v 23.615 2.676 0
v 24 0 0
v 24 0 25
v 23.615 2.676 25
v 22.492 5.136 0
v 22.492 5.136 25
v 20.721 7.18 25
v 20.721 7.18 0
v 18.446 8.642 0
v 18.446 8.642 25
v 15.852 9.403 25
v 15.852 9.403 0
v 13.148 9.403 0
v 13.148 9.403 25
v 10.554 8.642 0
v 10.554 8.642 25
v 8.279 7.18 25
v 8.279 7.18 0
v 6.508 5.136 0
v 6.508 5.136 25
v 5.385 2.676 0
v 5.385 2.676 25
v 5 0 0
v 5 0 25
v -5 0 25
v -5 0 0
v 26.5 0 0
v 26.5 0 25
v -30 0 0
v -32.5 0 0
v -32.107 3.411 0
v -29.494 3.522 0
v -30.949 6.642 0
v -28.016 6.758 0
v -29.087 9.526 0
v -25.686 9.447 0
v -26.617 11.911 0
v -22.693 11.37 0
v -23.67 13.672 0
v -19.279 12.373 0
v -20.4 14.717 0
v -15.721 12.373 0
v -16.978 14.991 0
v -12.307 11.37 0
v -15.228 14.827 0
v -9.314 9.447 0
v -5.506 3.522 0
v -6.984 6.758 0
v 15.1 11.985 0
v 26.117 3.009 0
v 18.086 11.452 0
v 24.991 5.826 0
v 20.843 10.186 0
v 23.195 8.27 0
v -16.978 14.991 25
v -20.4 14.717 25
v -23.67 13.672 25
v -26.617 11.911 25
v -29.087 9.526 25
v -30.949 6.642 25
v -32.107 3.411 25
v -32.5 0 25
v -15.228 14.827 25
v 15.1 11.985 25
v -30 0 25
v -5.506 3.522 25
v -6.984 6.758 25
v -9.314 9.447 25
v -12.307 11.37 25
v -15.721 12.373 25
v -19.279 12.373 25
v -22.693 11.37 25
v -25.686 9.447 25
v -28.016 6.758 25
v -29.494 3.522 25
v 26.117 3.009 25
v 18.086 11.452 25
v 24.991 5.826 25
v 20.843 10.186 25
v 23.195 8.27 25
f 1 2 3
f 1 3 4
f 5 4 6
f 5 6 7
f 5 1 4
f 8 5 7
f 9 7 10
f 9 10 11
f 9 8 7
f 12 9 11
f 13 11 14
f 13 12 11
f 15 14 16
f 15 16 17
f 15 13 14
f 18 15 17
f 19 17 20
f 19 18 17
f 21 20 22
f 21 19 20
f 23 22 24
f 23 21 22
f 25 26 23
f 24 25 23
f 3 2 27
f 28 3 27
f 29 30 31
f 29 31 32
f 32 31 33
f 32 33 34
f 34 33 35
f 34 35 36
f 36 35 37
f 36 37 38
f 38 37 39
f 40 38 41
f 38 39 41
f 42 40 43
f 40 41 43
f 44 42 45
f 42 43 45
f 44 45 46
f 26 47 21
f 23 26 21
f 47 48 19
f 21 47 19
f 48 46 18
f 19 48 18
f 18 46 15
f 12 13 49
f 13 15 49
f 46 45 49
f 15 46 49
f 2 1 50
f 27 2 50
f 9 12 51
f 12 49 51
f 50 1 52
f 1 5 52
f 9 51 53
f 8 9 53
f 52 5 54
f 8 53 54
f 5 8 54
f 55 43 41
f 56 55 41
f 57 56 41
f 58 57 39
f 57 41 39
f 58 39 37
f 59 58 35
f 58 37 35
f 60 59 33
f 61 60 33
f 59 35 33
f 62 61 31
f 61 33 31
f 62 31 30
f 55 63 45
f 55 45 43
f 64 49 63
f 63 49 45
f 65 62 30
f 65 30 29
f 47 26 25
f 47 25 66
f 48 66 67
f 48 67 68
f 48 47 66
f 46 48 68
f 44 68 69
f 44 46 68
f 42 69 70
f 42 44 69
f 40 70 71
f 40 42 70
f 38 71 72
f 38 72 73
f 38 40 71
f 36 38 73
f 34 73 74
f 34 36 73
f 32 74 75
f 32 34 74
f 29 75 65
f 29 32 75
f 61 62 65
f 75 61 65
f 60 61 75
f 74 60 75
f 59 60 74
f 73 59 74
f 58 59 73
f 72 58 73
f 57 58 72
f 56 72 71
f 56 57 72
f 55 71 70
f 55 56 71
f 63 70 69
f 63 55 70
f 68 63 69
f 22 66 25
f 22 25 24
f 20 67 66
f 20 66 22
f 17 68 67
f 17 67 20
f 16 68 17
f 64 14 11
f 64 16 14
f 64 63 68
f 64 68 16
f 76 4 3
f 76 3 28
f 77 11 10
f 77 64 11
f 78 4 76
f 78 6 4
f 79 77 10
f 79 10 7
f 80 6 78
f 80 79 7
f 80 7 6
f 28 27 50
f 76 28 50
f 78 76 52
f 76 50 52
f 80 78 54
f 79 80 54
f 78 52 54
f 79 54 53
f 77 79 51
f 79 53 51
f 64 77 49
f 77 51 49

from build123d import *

# Parameters (mm, degrees)
F0_R     = 12.5
F0_R_2   = 9.5
F1_DEPTH = 25
F2_W     = 68.842221
F2_H     = 15.526487
F3_DEPTH = 25


with BuildPart() as f1:
    # F0 (on Top) → F1 (new body)
    with BuildSketch(Plane.XY):
        with BuildLine():
            Line((15.099982, 11.984992), (-15.227959, 14.826929))
            Line((-15.227959, 14.826929), (-16.977903, 14.990911))
            ThreePointArc((-16.977903, 14.990911), (-32.492809, 0.464415), (-17.906726, -14.994485))
            Line((-17.906726, -14.994485), (-14.372817, -14.670403))
            Line((-14.372817, -14.670403), (14.782548, -11.996673))
            ThreePointArc((14.782548, -11.996673), (26.498949, -0.158824), (15.099982, 11.984992))
        make_face()
        with Locations((-17.5, 0)):
            Circle(F0_R, mode=Mode.SUBTRACT)
        with Locations((14.5, 0)):
            Circle(F0_R_2, mode=Mode.SUBTRACT)
    extrude(amount=F1_DEPTH)

    # F2 (on Top) → F3 (cut)
    with BuildSketch(Plane.XY):
        with Locations((-1.820405, -7.763243)):
            Rectangle(F2_W, F2_H)
    extrude(amount=F3_DEPTH, mode=Mode.SUBTRACT)


solid = f1.part
